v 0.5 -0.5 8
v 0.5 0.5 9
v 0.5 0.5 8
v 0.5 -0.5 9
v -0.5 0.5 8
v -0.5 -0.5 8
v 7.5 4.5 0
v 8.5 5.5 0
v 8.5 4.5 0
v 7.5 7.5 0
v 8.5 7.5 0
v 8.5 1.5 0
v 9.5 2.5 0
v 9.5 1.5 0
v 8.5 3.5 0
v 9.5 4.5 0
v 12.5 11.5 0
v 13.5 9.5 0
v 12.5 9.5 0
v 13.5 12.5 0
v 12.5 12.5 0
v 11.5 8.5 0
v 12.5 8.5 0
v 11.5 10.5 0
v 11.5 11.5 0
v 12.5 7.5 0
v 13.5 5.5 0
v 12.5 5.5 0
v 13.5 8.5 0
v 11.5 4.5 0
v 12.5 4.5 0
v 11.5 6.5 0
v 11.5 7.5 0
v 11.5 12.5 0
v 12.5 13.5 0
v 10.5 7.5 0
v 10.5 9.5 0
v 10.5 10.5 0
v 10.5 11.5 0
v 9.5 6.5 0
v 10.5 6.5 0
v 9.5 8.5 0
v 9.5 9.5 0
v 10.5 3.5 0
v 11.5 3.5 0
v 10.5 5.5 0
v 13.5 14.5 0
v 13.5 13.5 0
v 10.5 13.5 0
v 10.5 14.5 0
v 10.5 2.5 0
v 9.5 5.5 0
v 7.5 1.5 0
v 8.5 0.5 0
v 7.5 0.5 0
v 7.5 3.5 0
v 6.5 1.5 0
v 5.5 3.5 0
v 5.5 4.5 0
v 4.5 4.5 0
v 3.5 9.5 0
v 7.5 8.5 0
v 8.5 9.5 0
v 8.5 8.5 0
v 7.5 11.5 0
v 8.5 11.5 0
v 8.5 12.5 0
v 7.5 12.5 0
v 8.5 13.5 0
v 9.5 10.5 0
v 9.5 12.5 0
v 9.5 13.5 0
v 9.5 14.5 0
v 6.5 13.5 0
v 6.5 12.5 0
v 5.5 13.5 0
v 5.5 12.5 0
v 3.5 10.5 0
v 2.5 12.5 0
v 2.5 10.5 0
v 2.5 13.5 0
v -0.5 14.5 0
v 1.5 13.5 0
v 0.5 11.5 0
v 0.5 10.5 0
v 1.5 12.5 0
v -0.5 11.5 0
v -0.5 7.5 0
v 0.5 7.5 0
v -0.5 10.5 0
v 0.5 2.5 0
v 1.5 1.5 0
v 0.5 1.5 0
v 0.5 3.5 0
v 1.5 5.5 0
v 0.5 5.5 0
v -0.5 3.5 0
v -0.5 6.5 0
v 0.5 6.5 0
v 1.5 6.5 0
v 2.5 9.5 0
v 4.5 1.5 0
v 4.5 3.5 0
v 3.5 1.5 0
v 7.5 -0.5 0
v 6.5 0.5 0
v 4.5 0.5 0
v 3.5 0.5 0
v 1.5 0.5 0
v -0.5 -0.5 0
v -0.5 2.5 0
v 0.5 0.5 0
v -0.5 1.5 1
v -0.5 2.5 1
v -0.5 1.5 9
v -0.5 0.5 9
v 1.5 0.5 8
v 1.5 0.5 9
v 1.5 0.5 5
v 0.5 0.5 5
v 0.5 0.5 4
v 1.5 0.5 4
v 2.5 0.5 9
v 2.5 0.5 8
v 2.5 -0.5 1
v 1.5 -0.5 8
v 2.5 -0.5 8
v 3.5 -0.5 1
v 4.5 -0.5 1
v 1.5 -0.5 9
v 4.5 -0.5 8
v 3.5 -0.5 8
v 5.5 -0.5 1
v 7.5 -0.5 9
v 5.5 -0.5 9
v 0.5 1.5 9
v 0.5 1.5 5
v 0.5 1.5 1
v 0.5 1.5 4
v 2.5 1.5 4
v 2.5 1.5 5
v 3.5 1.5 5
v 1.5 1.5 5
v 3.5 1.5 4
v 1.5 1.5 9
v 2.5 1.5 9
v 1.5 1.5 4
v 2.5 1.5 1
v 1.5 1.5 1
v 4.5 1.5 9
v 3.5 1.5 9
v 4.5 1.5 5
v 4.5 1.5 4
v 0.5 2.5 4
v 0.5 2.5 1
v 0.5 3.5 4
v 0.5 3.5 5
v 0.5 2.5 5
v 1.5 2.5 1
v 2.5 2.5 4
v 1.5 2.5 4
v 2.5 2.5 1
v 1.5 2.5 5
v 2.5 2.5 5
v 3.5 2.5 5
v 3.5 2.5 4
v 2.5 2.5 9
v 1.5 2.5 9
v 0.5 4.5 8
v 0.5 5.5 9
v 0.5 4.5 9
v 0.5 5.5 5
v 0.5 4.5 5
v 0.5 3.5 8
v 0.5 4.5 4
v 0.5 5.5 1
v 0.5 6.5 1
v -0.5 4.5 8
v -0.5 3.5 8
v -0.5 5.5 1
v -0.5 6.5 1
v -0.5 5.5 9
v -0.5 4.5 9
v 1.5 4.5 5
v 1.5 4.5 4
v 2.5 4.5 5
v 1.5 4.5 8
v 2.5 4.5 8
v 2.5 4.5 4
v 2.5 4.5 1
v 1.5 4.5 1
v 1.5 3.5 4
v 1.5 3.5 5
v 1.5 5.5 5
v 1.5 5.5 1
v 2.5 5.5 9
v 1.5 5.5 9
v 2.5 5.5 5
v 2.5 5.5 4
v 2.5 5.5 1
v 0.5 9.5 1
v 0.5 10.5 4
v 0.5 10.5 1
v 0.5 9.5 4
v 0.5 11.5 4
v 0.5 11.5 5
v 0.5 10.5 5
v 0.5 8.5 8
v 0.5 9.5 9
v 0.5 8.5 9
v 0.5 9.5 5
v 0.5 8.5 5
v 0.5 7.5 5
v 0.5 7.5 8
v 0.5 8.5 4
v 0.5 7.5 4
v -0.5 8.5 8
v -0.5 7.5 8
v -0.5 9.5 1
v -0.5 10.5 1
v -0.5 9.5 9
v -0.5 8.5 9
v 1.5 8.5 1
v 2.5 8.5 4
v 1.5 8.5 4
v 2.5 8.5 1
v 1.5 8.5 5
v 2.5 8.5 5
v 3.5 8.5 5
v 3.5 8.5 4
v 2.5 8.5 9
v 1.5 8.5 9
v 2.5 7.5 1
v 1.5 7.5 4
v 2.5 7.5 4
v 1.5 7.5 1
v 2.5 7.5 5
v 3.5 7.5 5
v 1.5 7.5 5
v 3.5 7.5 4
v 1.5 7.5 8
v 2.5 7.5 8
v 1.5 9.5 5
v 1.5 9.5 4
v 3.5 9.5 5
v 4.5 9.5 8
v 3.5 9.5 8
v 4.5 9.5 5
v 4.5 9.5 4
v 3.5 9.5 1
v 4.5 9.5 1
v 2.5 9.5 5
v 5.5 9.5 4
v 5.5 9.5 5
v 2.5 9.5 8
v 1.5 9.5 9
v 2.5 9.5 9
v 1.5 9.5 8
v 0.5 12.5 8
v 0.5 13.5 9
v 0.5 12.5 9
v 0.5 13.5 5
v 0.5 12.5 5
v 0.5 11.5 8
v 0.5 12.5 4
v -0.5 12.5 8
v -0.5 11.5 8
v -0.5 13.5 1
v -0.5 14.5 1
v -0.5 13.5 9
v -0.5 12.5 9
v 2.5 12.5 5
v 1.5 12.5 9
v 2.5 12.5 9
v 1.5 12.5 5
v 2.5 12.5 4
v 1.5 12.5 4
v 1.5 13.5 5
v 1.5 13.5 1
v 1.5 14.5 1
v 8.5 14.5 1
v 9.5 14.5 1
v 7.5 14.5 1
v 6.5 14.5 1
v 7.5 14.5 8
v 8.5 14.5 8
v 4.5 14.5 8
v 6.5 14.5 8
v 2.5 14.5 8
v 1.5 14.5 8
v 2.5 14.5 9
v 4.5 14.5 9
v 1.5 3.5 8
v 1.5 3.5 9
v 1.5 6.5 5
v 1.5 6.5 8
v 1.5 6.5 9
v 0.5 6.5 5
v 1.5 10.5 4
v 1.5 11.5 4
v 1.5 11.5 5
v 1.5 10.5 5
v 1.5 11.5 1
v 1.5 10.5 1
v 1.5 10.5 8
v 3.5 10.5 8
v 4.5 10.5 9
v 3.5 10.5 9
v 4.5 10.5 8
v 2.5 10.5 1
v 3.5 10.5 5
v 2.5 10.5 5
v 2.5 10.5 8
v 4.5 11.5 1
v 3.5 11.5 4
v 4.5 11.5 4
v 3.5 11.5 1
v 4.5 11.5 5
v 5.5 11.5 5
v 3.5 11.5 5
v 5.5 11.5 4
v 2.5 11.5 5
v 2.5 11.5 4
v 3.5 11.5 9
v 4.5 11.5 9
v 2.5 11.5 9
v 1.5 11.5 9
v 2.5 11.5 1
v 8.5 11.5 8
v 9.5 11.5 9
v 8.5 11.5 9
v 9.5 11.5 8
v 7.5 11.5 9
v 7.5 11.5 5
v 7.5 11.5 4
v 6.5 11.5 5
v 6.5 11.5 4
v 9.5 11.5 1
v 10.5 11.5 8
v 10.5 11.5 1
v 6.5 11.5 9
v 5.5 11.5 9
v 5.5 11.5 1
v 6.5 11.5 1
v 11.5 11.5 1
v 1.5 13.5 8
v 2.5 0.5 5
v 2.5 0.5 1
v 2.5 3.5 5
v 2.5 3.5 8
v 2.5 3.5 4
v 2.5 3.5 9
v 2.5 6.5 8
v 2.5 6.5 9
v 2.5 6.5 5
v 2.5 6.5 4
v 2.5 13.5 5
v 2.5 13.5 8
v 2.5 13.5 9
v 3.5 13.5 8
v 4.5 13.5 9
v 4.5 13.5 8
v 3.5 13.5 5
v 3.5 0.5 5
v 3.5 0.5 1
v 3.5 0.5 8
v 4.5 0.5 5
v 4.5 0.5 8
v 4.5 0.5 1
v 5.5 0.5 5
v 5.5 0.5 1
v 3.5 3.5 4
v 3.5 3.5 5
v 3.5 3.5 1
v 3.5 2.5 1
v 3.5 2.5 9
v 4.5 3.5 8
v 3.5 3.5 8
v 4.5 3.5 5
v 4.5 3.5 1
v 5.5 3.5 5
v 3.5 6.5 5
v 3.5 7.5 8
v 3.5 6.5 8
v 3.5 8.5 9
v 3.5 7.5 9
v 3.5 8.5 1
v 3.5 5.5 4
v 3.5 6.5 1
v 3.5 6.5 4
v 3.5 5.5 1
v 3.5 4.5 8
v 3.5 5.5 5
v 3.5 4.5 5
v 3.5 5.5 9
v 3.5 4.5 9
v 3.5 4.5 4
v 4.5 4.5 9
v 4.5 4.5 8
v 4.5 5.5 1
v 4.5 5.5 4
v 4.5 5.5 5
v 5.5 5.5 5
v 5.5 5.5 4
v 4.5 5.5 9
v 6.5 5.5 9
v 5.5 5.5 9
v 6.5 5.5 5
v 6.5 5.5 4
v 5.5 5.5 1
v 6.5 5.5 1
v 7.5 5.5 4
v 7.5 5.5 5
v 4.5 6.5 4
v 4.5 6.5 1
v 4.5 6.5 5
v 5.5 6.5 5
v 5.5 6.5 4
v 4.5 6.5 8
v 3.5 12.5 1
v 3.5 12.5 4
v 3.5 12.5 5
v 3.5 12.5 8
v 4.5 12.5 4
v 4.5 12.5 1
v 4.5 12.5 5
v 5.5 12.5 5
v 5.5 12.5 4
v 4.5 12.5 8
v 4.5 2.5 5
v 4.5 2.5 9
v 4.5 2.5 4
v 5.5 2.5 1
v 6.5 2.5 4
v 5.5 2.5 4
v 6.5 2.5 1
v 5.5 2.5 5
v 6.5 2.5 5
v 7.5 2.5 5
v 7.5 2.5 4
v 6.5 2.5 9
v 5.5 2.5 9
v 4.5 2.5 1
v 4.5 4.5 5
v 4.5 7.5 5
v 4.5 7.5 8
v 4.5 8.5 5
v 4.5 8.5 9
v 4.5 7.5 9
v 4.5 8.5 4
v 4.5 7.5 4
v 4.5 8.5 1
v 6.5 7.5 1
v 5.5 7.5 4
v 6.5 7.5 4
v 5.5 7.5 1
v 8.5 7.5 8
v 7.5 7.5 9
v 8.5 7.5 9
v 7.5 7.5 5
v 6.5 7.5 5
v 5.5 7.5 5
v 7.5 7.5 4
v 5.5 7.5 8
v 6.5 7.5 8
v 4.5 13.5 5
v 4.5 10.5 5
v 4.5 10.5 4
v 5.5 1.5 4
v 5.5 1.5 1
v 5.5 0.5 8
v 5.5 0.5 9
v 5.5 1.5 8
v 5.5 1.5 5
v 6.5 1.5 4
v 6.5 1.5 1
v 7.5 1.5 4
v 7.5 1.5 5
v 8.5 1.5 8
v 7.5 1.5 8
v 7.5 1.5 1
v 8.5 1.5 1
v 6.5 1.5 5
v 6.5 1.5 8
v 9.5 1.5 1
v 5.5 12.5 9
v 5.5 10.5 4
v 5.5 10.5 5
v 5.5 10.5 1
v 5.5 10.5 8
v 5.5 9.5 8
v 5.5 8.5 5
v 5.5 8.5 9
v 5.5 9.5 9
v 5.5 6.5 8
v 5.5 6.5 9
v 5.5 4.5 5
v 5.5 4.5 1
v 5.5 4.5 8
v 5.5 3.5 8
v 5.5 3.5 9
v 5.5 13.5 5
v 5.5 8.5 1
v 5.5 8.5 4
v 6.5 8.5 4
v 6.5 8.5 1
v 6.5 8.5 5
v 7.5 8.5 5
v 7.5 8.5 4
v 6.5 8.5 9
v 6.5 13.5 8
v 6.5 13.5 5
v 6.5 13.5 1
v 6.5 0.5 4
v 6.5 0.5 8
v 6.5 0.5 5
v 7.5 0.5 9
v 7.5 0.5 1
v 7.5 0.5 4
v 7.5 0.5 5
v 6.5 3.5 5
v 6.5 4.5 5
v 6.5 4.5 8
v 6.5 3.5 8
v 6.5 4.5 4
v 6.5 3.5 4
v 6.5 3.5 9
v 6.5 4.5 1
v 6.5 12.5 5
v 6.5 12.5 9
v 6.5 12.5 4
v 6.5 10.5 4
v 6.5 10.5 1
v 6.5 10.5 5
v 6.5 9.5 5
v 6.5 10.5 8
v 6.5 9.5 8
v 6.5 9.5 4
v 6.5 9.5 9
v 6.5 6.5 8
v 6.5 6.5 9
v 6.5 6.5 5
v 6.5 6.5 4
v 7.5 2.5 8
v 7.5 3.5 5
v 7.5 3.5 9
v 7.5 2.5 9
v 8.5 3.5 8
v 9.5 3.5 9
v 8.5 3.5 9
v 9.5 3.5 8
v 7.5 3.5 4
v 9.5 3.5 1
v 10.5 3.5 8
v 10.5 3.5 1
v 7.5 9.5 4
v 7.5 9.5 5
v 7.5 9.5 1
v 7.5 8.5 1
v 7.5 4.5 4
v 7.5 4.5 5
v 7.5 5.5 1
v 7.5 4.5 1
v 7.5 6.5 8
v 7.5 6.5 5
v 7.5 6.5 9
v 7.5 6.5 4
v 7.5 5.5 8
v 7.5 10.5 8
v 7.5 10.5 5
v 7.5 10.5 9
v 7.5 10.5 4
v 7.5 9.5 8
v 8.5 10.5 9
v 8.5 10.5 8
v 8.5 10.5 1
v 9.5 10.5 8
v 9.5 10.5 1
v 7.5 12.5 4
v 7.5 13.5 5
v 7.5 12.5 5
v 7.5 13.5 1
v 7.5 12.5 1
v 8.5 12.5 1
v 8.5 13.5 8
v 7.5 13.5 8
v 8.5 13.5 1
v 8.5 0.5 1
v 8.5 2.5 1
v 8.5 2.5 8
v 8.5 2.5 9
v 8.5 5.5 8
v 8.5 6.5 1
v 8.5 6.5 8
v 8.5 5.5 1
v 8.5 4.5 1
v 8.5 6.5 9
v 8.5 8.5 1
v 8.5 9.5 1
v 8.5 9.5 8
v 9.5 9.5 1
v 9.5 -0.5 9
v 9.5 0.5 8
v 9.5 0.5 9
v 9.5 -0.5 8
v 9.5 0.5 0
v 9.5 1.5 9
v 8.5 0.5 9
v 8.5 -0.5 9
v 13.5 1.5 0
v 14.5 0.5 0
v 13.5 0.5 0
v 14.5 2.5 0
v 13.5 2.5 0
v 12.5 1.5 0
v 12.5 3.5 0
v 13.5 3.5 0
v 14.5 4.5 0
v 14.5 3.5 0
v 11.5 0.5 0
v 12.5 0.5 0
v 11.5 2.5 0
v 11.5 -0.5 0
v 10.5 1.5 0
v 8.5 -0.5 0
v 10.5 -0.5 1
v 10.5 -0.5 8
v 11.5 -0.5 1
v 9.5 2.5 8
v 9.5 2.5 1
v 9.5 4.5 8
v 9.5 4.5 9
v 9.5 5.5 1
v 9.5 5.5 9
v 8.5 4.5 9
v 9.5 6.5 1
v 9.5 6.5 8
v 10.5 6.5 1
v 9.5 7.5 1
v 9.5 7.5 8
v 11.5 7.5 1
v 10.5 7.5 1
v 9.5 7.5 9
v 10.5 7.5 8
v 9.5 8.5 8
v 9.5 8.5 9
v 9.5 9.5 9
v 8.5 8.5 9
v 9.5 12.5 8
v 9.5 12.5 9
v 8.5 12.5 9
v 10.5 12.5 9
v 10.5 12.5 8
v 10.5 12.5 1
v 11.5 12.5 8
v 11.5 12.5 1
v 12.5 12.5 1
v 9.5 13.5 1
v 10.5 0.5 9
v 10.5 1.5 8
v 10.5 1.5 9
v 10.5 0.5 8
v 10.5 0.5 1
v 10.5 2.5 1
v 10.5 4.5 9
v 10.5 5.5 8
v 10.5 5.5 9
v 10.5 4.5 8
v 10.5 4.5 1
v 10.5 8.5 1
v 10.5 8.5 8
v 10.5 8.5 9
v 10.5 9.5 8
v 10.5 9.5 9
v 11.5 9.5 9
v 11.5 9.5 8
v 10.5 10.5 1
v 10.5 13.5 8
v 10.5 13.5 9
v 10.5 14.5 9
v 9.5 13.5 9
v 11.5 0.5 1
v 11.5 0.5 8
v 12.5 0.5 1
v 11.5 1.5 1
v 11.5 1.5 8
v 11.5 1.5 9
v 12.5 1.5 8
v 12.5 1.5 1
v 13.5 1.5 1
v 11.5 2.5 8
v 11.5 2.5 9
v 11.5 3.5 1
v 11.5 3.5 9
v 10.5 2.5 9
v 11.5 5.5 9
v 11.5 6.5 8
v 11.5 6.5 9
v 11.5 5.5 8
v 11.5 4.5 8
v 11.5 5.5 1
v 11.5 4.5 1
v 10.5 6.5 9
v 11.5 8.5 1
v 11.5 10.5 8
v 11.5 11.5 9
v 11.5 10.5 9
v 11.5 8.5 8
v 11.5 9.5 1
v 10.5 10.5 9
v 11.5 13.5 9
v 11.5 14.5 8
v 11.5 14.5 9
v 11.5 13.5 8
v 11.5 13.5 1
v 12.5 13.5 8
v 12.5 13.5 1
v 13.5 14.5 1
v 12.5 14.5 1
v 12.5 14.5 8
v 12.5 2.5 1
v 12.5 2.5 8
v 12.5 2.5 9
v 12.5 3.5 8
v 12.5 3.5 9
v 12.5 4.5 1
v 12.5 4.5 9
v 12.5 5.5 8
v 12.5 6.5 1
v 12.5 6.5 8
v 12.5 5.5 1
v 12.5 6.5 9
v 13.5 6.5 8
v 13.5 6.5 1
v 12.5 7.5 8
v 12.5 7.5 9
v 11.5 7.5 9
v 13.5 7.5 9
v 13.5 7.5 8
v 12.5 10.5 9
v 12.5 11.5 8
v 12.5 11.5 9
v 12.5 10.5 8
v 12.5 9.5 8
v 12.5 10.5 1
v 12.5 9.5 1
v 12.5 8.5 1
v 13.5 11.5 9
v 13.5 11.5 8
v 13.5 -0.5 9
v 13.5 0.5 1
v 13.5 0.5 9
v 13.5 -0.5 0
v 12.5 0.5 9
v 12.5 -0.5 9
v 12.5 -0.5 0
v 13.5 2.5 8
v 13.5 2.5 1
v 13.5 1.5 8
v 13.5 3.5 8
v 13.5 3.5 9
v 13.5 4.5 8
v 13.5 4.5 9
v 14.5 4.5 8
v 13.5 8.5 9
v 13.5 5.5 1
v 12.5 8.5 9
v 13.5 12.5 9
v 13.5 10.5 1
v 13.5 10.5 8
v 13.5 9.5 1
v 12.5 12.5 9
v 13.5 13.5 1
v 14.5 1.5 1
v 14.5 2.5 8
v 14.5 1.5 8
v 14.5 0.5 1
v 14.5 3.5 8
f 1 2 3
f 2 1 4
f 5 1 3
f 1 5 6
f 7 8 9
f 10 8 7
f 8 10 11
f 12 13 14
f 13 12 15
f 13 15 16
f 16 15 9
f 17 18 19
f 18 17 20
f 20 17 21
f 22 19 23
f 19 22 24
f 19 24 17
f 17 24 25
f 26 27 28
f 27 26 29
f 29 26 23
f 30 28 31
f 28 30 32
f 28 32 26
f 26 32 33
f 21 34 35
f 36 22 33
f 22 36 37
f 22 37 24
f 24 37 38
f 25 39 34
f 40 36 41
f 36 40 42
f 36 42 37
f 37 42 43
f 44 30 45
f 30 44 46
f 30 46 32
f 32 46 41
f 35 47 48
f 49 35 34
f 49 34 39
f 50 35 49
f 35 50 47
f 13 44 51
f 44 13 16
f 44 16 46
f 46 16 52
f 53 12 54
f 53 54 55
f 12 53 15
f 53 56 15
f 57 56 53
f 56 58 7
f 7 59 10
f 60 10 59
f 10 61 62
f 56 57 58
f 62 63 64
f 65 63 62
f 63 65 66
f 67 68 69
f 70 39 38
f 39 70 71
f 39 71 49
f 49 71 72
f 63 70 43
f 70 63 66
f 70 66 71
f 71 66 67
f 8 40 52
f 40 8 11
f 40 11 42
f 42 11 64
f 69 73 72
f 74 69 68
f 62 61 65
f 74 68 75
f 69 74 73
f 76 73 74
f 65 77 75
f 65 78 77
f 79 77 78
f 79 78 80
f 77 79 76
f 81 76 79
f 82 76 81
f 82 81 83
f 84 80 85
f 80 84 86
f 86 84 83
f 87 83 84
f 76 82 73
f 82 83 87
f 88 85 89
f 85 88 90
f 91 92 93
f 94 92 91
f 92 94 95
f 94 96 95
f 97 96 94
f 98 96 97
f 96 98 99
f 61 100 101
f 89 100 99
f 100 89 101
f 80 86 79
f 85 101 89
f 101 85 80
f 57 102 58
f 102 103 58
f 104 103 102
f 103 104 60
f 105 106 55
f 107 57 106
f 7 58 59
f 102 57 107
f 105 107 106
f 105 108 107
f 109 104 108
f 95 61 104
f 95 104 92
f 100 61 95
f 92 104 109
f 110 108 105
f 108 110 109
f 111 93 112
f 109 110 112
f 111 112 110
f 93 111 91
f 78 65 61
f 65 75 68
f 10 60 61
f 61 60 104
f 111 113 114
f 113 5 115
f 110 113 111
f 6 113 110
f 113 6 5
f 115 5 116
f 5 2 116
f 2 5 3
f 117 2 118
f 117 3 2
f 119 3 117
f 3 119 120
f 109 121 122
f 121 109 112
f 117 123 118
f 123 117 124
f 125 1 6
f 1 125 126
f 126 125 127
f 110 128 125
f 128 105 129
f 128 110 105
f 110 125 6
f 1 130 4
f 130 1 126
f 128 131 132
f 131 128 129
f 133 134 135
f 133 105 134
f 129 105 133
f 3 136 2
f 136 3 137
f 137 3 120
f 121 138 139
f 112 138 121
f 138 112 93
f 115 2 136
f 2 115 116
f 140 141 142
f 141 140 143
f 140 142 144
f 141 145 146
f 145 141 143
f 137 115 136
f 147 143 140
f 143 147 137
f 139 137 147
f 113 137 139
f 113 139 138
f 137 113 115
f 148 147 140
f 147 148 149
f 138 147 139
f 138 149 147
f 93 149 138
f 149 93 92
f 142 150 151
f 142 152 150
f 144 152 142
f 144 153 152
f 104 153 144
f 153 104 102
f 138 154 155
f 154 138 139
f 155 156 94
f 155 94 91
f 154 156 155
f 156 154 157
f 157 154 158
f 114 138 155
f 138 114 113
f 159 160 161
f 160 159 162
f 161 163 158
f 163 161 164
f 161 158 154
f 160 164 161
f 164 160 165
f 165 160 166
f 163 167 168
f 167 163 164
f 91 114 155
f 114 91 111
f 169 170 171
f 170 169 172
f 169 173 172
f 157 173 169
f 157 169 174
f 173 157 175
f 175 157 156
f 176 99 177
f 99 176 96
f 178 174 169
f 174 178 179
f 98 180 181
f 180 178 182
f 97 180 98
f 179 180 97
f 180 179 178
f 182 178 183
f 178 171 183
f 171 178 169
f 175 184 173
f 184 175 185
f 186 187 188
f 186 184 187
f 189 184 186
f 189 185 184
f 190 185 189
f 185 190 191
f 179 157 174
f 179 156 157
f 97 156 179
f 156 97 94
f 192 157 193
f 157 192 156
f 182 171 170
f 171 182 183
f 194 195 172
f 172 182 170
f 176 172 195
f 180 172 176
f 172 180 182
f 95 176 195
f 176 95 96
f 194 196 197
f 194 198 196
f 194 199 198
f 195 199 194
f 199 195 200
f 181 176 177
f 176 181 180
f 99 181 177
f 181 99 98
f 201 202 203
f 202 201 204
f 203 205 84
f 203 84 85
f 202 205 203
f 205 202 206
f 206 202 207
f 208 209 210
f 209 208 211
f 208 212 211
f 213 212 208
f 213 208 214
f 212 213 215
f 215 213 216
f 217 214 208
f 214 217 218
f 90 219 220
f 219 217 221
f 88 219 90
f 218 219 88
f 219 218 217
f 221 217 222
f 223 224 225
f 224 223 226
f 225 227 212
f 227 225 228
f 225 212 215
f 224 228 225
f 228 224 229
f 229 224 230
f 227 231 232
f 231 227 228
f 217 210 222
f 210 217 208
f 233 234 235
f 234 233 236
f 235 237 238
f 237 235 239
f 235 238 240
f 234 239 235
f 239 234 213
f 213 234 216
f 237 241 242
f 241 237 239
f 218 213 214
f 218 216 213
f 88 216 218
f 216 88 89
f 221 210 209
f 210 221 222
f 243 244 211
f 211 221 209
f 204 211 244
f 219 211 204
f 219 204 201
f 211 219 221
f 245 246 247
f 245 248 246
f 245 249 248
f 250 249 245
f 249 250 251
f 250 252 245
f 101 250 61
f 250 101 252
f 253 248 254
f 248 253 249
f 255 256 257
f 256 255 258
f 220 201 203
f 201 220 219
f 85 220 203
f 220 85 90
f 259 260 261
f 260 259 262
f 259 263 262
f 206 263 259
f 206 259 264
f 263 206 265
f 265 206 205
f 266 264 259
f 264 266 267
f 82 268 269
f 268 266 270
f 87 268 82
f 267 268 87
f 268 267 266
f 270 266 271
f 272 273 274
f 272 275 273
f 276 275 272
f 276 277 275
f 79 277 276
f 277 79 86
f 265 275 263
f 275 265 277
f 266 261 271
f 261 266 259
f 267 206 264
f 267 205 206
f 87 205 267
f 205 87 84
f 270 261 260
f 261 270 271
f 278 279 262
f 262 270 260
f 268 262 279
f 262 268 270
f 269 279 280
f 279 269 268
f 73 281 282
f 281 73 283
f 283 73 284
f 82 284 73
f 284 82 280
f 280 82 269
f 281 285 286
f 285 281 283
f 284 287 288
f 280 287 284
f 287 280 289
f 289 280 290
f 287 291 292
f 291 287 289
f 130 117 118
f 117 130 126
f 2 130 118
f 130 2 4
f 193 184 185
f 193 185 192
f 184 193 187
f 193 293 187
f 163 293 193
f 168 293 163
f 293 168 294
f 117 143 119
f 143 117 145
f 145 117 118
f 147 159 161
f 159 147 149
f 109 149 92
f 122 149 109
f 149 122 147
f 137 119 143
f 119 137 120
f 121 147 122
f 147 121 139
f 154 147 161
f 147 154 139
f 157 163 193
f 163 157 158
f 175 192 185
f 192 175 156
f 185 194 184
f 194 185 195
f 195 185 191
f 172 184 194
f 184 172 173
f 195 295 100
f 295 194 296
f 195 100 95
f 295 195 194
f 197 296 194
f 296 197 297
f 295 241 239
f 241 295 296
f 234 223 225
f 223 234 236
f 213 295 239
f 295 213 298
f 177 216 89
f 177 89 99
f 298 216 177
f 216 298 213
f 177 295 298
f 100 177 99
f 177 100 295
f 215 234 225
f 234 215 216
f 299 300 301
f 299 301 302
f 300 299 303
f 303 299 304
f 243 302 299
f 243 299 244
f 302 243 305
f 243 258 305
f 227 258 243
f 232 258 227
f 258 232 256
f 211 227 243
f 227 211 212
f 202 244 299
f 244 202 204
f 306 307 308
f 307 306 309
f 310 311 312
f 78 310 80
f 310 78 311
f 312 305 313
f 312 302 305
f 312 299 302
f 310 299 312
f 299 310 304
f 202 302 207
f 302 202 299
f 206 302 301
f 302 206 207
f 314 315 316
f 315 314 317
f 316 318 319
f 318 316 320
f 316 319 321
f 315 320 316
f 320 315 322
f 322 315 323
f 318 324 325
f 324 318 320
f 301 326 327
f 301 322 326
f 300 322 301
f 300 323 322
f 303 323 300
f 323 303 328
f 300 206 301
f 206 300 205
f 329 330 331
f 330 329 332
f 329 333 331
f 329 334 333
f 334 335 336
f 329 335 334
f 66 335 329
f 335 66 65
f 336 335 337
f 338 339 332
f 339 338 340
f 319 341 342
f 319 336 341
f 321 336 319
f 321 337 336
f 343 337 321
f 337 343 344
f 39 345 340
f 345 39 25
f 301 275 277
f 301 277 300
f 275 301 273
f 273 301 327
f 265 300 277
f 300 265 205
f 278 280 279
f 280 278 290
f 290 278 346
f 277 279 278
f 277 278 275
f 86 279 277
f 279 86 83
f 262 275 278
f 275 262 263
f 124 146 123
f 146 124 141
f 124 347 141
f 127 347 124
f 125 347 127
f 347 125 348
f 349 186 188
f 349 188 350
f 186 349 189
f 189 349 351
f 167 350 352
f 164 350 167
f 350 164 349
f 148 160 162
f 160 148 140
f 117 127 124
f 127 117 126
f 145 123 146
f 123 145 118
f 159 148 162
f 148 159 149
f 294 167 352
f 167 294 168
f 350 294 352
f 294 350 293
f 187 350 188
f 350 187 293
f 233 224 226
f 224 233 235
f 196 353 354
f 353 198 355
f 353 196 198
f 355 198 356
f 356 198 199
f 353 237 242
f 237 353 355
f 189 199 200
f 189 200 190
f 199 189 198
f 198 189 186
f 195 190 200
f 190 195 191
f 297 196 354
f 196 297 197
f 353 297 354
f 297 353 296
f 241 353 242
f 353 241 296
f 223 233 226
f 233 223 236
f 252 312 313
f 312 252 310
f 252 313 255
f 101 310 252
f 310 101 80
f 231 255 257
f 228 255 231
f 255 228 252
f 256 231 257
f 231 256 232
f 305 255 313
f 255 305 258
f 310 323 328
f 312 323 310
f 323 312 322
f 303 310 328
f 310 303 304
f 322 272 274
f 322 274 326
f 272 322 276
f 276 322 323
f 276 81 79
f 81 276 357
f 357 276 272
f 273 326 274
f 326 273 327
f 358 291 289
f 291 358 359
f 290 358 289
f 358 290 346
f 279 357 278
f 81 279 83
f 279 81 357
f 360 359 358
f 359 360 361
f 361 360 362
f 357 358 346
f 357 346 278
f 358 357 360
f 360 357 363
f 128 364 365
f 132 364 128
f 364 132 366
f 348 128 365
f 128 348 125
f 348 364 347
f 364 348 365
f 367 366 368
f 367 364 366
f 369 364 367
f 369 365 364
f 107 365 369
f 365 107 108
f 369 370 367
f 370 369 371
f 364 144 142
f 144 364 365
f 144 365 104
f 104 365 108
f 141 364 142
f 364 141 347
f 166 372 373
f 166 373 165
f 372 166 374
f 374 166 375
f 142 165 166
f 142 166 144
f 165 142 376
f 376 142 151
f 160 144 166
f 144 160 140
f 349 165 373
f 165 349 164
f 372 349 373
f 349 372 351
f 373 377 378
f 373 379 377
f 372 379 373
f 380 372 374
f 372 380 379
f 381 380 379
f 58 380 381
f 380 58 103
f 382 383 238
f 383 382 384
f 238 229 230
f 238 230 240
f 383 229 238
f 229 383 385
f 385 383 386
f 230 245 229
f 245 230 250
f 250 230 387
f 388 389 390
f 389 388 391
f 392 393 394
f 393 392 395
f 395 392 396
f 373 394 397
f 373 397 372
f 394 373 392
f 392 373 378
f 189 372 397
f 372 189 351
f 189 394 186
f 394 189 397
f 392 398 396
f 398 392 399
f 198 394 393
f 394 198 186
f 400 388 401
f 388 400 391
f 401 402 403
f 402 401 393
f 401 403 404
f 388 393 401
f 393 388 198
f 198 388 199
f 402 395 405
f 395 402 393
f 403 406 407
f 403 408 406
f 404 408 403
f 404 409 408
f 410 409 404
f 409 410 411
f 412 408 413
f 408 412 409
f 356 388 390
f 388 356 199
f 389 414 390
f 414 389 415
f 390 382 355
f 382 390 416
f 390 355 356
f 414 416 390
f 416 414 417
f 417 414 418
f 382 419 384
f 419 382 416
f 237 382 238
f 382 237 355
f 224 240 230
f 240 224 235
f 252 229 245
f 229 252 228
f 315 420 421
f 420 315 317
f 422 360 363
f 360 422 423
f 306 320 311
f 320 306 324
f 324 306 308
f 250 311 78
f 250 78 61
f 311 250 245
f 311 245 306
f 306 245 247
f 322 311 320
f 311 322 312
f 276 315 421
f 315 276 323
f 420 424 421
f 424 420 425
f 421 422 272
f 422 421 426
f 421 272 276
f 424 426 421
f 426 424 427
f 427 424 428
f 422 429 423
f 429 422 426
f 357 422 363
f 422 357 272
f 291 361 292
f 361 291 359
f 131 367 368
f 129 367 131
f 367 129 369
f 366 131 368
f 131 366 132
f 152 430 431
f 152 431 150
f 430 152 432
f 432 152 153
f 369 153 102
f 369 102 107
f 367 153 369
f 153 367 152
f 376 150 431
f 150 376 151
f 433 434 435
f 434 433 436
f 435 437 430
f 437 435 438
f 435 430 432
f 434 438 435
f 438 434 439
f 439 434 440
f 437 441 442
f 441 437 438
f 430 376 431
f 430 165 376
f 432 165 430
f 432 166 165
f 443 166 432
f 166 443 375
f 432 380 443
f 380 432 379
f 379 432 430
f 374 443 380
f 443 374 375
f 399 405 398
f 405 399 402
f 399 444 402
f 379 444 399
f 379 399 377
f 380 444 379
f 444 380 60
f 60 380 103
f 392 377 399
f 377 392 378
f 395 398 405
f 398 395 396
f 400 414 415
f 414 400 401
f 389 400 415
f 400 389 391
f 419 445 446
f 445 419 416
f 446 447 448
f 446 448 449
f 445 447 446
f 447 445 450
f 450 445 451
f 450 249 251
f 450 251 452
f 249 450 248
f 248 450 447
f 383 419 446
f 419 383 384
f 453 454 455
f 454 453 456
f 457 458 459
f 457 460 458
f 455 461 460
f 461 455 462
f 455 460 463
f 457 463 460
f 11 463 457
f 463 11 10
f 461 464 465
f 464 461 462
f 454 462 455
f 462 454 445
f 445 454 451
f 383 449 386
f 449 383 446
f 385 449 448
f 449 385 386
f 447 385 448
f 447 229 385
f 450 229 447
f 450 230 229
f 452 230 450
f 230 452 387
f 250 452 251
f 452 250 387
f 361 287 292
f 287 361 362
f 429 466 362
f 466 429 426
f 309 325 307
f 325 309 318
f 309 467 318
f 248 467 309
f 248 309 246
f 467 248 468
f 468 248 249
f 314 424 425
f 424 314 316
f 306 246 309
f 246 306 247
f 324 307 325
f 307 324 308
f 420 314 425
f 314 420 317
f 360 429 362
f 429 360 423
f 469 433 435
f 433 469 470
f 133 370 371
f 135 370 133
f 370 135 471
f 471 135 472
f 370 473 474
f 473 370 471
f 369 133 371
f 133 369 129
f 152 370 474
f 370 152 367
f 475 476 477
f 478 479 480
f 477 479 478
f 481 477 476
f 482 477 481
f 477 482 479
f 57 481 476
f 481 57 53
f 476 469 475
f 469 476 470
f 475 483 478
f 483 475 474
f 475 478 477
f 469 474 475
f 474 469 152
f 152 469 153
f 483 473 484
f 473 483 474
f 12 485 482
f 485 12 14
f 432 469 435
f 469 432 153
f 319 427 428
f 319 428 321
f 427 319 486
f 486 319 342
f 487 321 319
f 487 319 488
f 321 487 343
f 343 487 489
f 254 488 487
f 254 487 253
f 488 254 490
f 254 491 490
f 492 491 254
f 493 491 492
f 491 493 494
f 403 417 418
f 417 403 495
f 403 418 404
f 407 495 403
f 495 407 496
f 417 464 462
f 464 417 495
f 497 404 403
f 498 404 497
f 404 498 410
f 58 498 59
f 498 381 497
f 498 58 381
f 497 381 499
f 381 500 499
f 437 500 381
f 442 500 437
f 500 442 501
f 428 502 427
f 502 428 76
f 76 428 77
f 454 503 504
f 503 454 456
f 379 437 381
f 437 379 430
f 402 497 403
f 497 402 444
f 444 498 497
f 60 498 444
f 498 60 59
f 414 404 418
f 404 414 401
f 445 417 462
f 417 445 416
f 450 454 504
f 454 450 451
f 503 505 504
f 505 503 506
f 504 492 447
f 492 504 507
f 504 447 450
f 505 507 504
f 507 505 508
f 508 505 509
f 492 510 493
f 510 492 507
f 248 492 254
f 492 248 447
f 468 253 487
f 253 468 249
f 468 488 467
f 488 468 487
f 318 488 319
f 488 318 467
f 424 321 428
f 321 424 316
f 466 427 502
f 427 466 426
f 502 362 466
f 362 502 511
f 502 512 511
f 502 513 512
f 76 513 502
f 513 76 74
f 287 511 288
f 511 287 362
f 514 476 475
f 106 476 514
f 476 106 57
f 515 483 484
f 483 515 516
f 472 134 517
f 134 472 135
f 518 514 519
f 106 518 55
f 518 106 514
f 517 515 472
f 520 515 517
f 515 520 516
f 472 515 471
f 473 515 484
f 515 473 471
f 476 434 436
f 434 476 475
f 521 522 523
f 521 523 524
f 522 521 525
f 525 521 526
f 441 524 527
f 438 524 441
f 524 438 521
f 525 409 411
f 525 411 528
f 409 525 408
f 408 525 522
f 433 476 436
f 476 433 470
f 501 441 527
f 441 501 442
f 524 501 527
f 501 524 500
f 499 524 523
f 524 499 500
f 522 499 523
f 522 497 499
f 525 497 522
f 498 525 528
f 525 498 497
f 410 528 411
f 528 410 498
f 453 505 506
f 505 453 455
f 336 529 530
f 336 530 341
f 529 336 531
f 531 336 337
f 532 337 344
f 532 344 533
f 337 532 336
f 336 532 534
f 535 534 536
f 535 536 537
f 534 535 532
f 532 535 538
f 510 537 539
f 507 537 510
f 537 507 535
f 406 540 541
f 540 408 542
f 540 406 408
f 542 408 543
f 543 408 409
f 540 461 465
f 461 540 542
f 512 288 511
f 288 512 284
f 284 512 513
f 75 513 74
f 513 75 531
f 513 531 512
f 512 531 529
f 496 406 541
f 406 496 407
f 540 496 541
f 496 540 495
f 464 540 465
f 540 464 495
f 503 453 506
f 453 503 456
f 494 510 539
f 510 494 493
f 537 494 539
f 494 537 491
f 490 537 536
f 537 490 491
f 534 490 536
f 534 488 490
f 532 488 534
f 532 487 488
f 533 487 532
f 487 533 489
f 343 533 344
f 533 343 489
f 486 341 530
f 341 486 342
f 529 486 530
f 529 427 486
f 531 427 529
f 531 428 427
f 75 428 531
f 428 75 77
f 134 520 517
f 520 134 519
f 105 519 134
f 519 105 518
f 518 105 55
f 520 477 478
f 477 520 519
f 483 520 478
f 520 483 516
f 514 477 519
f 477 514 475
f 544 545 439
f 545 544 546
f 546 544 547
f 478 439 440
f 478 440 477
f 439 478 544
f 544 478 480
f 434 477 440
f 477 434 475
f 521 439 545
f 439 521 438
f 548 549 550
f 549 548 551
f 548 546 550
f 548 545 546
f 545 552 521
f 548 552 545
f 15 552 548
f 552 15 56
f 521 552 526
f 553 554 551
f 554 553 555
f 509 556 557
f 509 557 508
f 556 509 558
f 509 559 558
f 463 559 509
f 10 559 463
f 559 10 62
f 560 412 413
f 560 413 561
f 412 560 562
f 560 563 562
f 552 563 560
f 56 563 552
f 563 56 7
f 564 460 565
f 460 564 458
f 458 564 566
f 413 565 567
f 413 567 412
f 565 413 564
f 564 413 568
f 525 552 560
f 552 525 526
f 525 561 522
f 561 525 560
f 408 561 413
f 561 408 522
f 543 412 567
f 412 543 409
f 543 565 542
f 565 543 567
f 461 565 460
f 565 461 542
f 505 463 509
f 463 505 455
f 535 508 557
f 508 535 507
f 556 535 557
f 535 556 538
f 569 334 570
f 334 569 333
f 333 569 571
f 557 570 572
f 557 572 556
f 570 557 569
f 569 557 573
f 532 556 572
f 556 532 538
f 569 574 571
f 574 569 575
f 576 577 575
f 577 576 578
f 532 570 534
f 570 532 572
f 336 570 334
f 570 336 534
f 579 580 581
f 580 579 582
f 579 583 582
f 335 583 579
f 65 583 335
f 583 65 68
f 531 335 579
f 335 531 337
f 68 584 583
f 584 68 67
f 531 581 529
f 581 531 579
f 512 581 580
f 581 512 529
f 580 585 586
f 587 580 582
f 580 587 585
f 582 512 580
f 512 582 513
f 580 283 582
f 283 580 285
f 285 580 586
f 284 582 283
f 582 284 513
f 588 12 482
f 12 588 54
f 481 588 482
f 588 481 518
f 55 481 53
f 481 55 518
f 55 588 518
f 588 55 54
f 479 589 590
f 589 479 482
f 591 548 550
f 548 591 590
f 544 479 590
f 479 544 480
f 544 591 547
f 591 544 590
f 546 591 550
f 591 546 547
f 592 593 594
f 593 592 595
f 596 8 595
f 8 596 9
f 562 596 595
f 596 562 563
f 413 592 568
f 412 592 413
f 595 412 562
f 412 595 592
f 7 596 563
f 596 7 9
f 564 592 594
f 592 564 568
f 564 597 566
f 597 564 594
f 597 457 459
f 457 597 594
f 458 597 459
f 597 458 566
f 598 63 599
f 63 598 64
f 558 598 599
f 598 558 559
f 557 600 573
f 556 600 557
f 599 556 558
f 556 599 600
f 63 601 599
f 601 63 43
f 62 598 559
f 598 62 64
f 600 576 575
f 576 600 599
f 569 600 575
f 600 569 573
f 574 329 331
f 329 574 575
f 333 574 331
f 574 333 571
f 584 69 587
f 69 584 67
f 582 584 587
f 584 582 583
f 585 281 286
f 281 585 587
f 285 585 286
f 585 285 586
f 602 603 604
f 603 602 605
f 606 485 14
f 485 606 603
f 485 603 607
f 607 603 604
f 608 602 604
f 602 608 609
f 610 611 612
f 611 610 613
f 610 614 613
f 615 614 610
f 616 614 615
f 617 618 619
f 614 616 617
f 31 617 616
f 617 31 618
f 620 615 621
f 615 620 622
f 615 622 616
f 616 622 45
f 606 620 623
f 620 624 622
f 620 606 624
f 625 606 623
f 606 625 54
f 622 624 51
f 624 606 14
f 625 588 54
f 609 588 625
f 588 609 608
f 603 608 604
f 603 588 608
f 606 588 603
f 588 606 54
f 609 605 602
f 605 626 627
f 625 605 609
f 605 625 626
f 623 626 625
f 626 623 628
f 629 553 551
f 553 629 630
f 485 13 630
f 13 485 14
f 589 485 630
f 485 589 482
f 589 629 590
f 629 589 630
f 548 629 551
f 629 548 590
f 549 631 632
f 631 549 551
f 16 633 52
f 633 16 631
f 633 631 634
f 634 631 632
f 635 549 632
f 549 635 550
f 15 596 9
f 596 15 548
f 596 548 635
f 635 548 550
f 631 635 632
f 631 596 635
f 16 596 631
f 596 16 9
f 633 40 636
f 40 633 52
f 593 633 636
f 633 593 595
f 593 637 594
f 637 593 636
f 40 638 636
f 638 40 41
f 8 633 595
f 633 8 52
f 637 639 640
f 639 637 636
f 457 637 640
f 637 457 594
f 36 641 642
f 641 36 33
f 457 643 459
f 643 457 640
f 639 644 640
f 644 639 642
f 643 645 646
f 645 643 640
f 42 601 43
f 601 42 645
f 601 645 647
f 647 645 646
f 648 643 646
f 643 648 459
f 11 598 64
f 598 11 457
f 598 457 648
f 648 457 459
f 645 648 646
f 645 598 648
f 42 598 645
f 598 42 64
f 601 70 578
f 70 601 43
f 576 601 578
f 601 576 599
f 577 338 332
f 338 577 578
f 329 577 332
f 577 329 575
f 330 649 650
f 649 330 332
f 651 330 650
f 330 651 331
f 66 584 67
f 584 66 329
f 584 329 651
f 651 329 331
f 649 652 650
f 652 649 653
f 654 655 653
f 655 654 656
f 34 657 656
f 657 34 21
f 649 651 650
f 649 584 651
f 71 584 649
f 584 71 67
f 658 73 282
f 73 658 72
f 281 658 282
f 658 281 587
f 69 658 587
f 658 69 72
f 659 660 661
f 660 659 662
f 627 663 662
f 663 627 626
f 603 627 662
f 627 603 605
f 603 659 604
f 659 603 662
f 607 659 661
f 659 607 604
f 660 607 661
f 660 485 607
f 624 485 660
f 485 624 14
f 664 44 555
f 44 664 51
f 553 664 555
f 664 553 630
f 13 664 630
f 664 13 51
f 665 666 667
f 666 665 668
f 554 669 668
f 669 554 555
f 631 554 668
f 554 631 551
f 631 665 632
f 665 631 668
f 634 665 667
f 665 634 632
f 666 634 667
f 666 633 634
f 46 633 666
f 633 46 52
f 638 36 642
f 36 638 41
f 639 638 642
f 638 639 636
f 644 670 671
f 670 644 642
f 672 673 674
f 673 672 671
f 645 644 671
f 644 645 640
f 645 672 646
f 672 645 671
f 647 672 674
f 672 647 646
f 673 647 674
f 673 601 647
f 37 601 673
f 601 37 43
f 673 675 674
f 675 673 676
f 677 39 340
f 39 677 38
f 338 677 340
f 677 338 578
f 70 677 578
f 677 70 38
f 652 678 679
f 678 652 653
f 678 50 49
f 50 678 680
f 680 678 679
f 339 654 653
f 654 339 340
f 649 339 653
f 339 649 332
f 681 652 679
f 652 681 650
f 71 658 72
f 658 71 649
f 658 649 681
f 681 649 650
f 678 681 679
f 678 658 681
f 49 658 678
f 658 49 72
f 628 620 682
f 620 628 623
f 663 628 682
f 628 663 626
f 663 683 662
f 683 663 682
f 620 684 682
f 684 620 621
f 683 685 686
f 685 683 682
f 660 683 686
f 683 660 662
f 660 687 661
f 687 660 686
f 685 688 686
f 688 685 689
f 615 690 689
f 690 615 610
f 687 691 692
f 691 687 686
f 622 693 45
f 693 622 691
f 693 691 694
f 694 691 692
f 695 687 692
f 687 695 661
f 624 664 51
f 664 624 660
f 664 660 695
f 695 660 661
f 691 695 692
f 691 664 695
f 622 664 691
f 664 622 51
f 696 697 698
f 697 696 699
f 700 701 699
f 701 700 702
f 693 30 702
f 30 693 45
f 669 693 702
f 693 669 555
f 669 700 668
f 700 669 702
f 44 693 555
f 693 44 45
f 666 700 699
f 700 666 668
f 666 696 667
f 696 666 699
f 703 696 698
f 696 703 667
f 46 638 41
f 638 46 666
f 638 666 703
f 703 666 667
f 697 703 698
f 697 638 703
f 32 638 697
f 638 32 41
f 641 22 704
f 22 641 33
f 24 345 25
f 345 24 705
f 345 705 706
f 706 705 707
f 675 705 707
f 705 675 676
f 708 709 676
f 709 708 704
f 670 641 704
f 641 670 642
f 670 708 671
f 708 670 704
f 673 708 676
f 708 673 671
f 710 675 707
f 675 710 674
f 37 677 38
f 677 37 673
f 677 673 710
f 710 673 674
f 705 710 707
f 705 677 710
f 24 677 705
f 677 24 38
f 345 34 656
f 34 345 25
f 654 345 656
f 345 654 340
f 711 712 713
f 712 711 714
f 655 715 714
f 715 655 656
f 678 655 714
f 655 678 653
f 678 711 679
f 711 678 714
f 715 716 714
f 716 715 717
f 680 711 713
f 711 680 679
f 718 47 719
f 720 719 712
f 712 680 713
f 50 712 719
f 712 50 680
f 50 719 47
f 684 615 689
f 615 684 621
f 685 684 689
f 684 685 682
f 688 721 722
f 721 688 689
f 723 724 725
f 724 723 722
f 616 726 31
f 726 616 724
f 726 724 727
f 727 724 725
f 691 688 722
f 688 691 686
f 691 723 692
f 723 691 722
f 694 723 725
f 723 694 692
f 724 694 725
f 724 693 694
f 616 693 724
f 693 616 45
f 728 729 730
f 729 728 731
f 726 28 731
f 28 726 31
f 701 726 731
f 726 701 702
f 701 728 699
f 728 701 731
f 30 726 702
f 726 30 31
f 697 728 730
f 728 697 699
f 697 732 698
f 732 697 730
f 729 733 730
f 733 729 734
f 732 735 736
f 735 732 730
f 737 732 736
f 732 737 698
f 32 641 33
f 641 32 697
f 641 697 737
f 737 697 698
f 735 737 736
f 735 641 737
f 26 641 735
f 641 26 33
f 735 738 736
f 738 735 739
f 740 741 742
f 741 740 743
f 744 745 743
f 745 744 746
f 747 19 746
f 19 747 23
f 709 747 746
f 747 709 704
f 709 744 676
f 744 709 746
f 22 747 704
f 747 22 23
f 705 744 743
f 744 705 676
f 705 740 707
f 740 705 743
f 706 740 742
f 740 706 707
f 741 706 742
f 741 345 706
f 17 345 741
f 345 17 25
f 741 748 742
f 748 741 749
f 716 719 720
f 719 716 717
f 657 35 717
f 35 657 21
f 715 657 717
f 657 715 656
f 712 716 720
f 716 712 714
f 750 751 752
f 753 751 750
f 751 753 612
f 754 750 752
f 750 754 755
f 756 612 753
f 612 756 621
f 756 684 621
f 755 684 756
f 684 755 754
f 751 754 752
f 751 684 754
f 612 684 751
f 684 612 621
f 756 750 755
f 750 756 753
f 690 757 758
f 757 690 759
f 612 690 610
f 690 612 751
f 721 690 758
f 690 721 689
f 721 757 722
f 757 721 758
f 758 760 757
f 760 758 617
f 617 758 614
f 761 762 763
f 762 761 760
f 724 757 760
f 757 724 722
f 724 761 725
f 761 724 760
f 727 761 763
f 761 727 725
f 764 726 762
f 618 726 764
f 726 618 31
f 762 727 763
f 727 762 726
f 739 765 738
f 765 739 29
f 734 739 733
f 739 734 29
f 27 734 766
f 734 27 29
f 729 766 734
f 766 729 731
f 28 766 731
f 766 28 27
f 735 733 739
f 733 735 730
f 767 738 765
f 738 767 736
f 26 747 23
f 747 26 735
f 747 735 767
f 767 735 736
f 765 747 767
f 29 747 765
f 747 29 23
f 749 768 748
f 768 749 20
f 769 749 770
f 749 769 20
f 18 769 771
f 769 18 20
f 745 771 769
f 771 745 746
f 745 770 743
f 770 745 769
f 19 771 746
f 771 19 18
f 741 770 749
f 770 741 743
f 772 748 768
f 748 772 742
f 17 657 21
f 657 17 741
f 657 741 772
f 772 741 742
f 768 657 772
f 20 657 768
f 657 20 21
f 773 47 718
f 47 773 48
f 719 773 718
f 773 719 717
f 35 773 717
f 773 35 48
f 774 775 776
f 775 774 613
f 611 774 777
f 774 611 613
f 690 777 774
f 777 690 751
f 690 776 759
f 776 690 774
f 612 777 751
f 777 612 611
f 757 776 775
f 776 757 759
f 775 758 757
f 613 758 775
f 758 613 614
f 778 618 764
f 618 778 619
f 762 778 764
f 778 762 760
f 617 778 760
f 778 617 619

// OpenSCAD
union() {
    translate([0, 0, 4.0]) cube([1, 1, 8], center=true);
    translate([0, 1, 4.5]) cube([1, 1, 9], center=true);
    translate([0, 2, 0.5]) cube([1, 1, 1], center=true);
    translate([0, 4, 4.0]) cube([1, 1, 8], center=true);
    translate([0, 5, 4.5]) cube([1, 1, 9], center=true);
    translate([0, 6, 0.5]) cube([1, 1, 1], center=true);
    translate([0, 8, 4.0]) cube([1, 1, 8], center=true);
    translate([0, 9, 4.5]) cube([1, 1, 9], center=true);
    translate([0, 10, 0.5]) cube([1, 1, 1], center=true);
    translate([0, 12, 4.0]) cube([1, 1, 8], center=true);
    translate([0, 13, 4.5]) cube([1, 1, 9], center=true);
    translate([0, 14, 0.5]) cube([1, 1, 1], center=true);
    translate([1, 0, 4.5]) cube([1, 1, 9], center=true);
    translate([1, 1, 4.5]) color([1, 0, 0]) cube([1, 1, 1], center=true);
    translate([1, 2, 2.0]) cube([1, 1, 4], center=true);
    translate([1, 3, 2.5]) cube([1, 1, 5], center=true);
    translate([1, 4, 2.0]) cube([1, 1, 4], center=true);
    translate([1, 5, 2.5]) cube([1, 1, 5], center=true);
    translate([1, 7, 2.5]) cube([1, 1, 5], center=true);
    translate([1, 8, 2.0]) cube([1, 1, 4], center=true);
    translate([1, 9, 2.5]) cube([1, 1, 5], center=true);
    translate([1, 10, 2.0]) cube([1, 1, 4], center=true);
    translate([1, 11, 2.5]) cube([1, 1, 5], center=true);
    translate([1, 12, 2.0]) cube([1, 1, 4], center=true);
    translate([1, 13, 2.5]) cube([1, 1, 5], center=true);
    translate([1, 14, 0.5]) cube([1, 1, 1], center=true);
    translate([2, 0, 4.0]) cube([1, 1, 8], center=true);
    translate([2, 1, 4.5]) cube([1, 1, 9], center=true);
    translate([2, 2, 0.5]) cube([1, 1, 1], center=true);
    translate([2, 3, 4.5]) cube([1, 1, 9], center=true);
    translate([2, 4, 4.0]) cube([1, 1, 8], center=true);
    translate([2, 5, 0.5]) cube([1, 1, 1], center=true);
    translate([2, 6, 4.5]) cube([1, 1, 9], center=true);
    translate([2, 7, 4.0]) cube([1, 1, 8], center=true);
    translate([2, 8, 0.5]) cube([1, 1, 1], center=true);
    translate([2, 9, 4.5]) cube([1, 1, 9], center=true);
    translate([2, 10, 4.0]) cube([1, 1, 8], center=true);
    translate([2, 11, 0.5]) cube([1, 1, 1], center=true);
    translate([2, 12, 4.5]) cube([1, 1, 9], center=true);
    translate([2, 14, 4.0]) cube([1, 1, 8], center=true);
    translate([3, 0, 0.5]) cube([1, 1, 1], center=true);
    translate([3, 1, 2.5]) cube([1, 1, 5], center=true);
    translate([3, 2, 2.0]) cube([1, 1, 4], center=true);
    translate([3, 3, 2.5]) cube([1, 1, 5], center=true);
    translate([3, 4, 2.0]) cube([1, 1, 4], center=true);
    translate([3, 5, 2.5]) cube([1, 1, 5], center=true);
    translate([3, 6, 2.0]) cube([1, 1, 4], center=true);
    translate([3, 7, 2.5]) cube([1, 1, 5], center=true);
    translate([3, 8, 2.0]) cube([1, 1, 4], center=true);
    translate([3, 9, 2.5]) cube([1, 1, 5], center=true);
    translate([3, 11, 2.5]) cube([1, 1, 5], center=true);
    translate([3, 12, 2.0]) cube([1, 1, 4], center=true);
    translate([3, 13, 2.5]) cube([1, 1, 5], center=true);
    translate([3, 14, 4.5]) cube([1, 1, 9], center=true);
    translate([4, 0, 4.0]) cube([1, 1, 8], center=true);
    translate([4, 2, 4.5]) cube([1, 1, 9], center=true);
    translate([4, 3, 0.5]) cube([1, 1, 1], center=true);
    translate([4, 4, 4.0]) cube([1, 1, 8], center=true);
    translate([4, 5, 4.5]) cube([1, 1, 9], center=true);
    translate([4, 6, 0.5]) cube([1, 1, 1], center=true);
    translate([4, 7, 4.0]) cube([1, 1, 8], center=true);
    translate([4, 8, 4.5]) cube([1, 1, 9], center=true);
    translate([4, 9, 0.5]) cube([1, 1, 1], center=true);
    translate([4, 10, 4.0]) cube([1, 1, 8], center=true);
    translate([4, 11, 4.5]) cube([1, 1, 9], center=true);
    translate([4, 12, 0.5]) cube([1, 1, 1], center=true);
    translate([4, 13, 4.0]) cube([1, 1, 8], center=true);
    translate([4, 14, 4.5]) cube([1, 1, 9], center=true);
    translate([5, 0, 0.5]) cube([1, 1, 1], center=true);
    translate([5, 1, 2.5]) cube([1, 1, 5], center=true);
    translate([5, 2, 2.0]) cube([1, 1, 4], center=true);
    translate([5, 3, 2.5]) cube([1, 1, 5], center=true);
    translate([5, 5, 2.5]) cube([1, 1, 5], center=true);
    translate([5, 6, 2.0]) cube([1, 1, 4], center=true);
    translate([5, 7, 2.5]) cube([1, 1, 5], center=true);
    translate([5, 8, 2.0]) cube([1, 1, 4], center=true);
    translate([5, 9, 2.5]) cube([1, 1, 5], center=true);
    translate([5, 10, 2.0]) cube([1, 1, 4], center=true);
    translate([5, 11, 2.5]) cube([1, 1, 5], center=true);
    translate([5, 12, 2.0]) cube([1, 1, 4], center=true);
    translate([5, 13, 2.5]) cube([1, 1, 5], center=true);
    translate([5, 14, 4.0]) cube([1, 1, 8], center=true);
    translate([6, 0, 4.5]) cube([1, 1, 9], center=true);
    translate([6, 1, 4.0]) cube([1, 1, 8], center=true);
    translate([6, 2, 0.5]) cube([1, 1, 1], center=true);
    translate([6, 3, 4.5]) cube([1, 1, 9], center=true);
    translate([6, 4, 4.0]) cube([1, 1, 8], center=true);
    translate([6, 5, 0.5]) cube([1, 1, 1], center=true);
    translate([6, 6, 4.5]) cube([1, 1, 9], center=true);
    translate([6, 7, 4.0]) cube([1, 1, 8], center=true);
    translate([6, 8, 0.5]) cube([1, 1, 1], center=true);
    translate([6, 9, 4.5]) cube([1, 1, 9], center=true);
    translate([6, 10, 4.0]) cube([1, 1, 8], center=true);
    translate([6, 11, 0.5]) cube([1, 1, 1], center=true);
    translate([6, 12, 4.5]) cube([1, 1, 9], center=true);
    translate([6, 14, 4.0]) cube([1, 1, 8], center=true);
    translate([7, 0, 4.5]) cube([1, 1, 9], center=true);
    translate([7, 1, 4.5]) color([0, 0, 1]) cube([1, 1, 1], center=true);
    translate([7, 2, 2.0]) cube([1, 1, 4], center=true);
    translate([7, 3, 2.5]) cube([1, 1, 5], center=true);
    translate([7, 4, 2.0]) cube([1, 1, 4], center=true);
    translate([7, 5, 2.5]) cube([1, 1, 5], center=true);
    translate([7, 6, 2.0]) cube([1, 1, 4], center=true);
    translate([7, 7, 2.5]) cube([1, 1, 5], center=true);
    translate([7, 8, 2.0]) cube([1, 1, 4], center=true);
    translate([7, 9, 2.5]) cube([1, 1, 5], center=true);
    translate([7, 10, 2.0]) cube([1, 1, 4], center=true);
    translate([7, 11, 2.5]) cube([1, 1, 5], center=true);
    translate([7, 12, 2.0]) cube([1, 1, 4], center=true);
    translate([7, 13, 2.5]) cube([1, 1, 5], center=true);
    translate([7, 14, 0.5]) cube([1, 1, 1], center=true);
    translate([8, 1, 0.5]) cube([1, 1, 1], center=true);
    translate([8, 2, 4.0]) cube([1, 1, 8], center=true);
    translate([8, 3, 4.5]) cube([1, 1, 9], center=true);
    translate([8, 5, 0.5]) cube([1, 1, 1], center=true);
    translate([8, 6, 4.0]) cube([1, 1, 8], center=true);
    translate([8, 7, 4.5]) cube([1, 1, 9], center=true);
    translate([8, 9, 0.5]) cube([1, 1, 1], center=true);
    translate([8, 10, 4.0]) cube([1, 1, 8], center=true);
    translate([8, 11, 4.5]) cube([1, 1, 9], center=true);
    translate([8, 13, 0.5]) cube([1, 1, 1], center=true);
    translate([8, 14, 4.0]) cube([1, 1, 8], center=true);
    translate([9, 0, 4.5]) cube([1, 1, 9], center=true);
    translate([9, 2, 0.5]) cube([1, 1, 1], center=true);
    translate([9, 3, 4.0]) cube([1, 1, 8], center=true);
    translate([9, 4, 4.5]) cube([1, 1, 9], center=true);
    translate([9, 6, 0.5]) cube([1, 1, 1], center=true);
    translate([9, 7, 4.0]) cube([1, 1, 8], center=true);
    translate([9, 8, 4.5]) cube([1, 1, 9], center=true);
    translate([9, 10, 0.5]) cube([1, 1, 1], center=true);
    translate([9, 11, 4.0]) cube([1, 1, 8], center=true);
    translate([9, 12, 4.5]) cube([1, 1, 9], center=true);
    translate([9, 14, 0.5]) cube([1, 1, 1], center=true);
    translate([10, 0, 4.0]) cube([1, 1, 8], center=true);
    translate([10, 1, 4.5]) cube([1, 1, 9], center=true);
    translate([10, 3, 0.5]) cube([1, 1, 1], center=true);
    translate([10, 4, 4.0]) cube([1, 1, 8], center=true);
    translate([10, 5, 4.5]) cube([1, 1, 9], center=true);
    translate([10, 7, 0.5]) cube([1, 1, 1], center=true);
    translate([10, 8, 4.0]) cube([1, 1, 8], center=true);
    translate([10, 9, 4.5]) cube([1, 1, 9], center=true);
    translate([10, 11, 0.5]) cube([1, 1, 1], center=true);
    translate([10, 12, 4.0]) cube([1, 1, 8], center=true);
    translate([10, 13, 4.5]) cube([1, 1, 9], center=true);
    translate([11, 0, 0.5]) cube([1, 1, 1], center=true);
    translate([11, 1, 4.0]) cube([1, 1, 8], center=true);
    translate([11, 2, 4.5]) cube([1, 1, 9], center=true);
    translate([11, 4, 0.5]) cube([1, 1, 1], center=true);
    translate([11, 5, 4.0]) cube([1, 1, 8], center=true);
    translate([11, 6, 4.5]) cube([1, 1, 9], center=true);
    translate([11, 8, 0.5]) cube([1, 1, 1], center=true);
    translate([11, 9, 4.0]) cube([1, 1, 8], center=true);
    translate([11, 10, 4.5]) cube([1, 1, 9], center=true);
    translate([11, 12, 0.5]) cube([1, 1, 1], center=true);
    translate([11, 13, 4.0]) cube([1, 1, 8], center=true);
    translate([11, 14, 4.5]) cube([1, 1, 9], center=true);
    translate([12, 1, 0.5]) cube([1, 1, 1], center=true);
    translate([12, 2, 4.0]) cube([1, 1, 8], center=true);
    translate([12, 3, 4.5]) cube([1, 1, 9], center=true);
    translate([12, 5, 0.5]) cube([1, 1, 1], center=true);
    translate([12, 6, 4.0]) cube([1, 1, 8], center=true);
    translate([12, 7, 4.5]) cube([1, 1, 9], center=true);
    translate([12, 9, 0.5]) cube([1, 1, 1], center=true);
    translate([12, 10, 4.0]) cube([1, 1, 8], center=true);
    translate([12, 11, 4.5]) cube([1, 1, 9], center=true);
    translate([12, 13, 0.5]) cube([1, 1, 1], center=true);
    translate([12, 14, 4.0]) cube([1, 1, 8], center=true);
    translate([13, 0, 4.5]) cube([1, 1, 9], center=true);
    translate([13, 2, 0.5]) cube([1, 1, 1], center=true);
    translate([13, 3, 4.0]) cube([1, 1, 8], center=true);
    translate([13, 4, 4.5]) cube([1, 1, 9], center=true);
    translate([13, 6, 0.5]) cube([1, 1, 1], center=true);
    translate([13, 7, 4.0]) cube([1, 1, 8], center=true);
    translate([13, 8, 4.5]) cube([1, 1, 9], center=true);
    translate([13, 10, 0.5]) cube([1, 1, 1], center=true);
    translate([13, 11, 4.0]) cube([1, 1, 8], center=true);
    translate([13, 12, 4.5]) cube([1, 1, 9], center=true);
    translate([13, 14, 0.5]) cube([1, 1, 1], center=true);
    translate([14, 1, 0.5]) cube([1, 1, 1], center=true);
    translate([14, 2, 4.0]) cube([1, 1, 8], center=true);
    translate([14, 4, 4.0]) cube([1, 1, 8], center=true);
}
